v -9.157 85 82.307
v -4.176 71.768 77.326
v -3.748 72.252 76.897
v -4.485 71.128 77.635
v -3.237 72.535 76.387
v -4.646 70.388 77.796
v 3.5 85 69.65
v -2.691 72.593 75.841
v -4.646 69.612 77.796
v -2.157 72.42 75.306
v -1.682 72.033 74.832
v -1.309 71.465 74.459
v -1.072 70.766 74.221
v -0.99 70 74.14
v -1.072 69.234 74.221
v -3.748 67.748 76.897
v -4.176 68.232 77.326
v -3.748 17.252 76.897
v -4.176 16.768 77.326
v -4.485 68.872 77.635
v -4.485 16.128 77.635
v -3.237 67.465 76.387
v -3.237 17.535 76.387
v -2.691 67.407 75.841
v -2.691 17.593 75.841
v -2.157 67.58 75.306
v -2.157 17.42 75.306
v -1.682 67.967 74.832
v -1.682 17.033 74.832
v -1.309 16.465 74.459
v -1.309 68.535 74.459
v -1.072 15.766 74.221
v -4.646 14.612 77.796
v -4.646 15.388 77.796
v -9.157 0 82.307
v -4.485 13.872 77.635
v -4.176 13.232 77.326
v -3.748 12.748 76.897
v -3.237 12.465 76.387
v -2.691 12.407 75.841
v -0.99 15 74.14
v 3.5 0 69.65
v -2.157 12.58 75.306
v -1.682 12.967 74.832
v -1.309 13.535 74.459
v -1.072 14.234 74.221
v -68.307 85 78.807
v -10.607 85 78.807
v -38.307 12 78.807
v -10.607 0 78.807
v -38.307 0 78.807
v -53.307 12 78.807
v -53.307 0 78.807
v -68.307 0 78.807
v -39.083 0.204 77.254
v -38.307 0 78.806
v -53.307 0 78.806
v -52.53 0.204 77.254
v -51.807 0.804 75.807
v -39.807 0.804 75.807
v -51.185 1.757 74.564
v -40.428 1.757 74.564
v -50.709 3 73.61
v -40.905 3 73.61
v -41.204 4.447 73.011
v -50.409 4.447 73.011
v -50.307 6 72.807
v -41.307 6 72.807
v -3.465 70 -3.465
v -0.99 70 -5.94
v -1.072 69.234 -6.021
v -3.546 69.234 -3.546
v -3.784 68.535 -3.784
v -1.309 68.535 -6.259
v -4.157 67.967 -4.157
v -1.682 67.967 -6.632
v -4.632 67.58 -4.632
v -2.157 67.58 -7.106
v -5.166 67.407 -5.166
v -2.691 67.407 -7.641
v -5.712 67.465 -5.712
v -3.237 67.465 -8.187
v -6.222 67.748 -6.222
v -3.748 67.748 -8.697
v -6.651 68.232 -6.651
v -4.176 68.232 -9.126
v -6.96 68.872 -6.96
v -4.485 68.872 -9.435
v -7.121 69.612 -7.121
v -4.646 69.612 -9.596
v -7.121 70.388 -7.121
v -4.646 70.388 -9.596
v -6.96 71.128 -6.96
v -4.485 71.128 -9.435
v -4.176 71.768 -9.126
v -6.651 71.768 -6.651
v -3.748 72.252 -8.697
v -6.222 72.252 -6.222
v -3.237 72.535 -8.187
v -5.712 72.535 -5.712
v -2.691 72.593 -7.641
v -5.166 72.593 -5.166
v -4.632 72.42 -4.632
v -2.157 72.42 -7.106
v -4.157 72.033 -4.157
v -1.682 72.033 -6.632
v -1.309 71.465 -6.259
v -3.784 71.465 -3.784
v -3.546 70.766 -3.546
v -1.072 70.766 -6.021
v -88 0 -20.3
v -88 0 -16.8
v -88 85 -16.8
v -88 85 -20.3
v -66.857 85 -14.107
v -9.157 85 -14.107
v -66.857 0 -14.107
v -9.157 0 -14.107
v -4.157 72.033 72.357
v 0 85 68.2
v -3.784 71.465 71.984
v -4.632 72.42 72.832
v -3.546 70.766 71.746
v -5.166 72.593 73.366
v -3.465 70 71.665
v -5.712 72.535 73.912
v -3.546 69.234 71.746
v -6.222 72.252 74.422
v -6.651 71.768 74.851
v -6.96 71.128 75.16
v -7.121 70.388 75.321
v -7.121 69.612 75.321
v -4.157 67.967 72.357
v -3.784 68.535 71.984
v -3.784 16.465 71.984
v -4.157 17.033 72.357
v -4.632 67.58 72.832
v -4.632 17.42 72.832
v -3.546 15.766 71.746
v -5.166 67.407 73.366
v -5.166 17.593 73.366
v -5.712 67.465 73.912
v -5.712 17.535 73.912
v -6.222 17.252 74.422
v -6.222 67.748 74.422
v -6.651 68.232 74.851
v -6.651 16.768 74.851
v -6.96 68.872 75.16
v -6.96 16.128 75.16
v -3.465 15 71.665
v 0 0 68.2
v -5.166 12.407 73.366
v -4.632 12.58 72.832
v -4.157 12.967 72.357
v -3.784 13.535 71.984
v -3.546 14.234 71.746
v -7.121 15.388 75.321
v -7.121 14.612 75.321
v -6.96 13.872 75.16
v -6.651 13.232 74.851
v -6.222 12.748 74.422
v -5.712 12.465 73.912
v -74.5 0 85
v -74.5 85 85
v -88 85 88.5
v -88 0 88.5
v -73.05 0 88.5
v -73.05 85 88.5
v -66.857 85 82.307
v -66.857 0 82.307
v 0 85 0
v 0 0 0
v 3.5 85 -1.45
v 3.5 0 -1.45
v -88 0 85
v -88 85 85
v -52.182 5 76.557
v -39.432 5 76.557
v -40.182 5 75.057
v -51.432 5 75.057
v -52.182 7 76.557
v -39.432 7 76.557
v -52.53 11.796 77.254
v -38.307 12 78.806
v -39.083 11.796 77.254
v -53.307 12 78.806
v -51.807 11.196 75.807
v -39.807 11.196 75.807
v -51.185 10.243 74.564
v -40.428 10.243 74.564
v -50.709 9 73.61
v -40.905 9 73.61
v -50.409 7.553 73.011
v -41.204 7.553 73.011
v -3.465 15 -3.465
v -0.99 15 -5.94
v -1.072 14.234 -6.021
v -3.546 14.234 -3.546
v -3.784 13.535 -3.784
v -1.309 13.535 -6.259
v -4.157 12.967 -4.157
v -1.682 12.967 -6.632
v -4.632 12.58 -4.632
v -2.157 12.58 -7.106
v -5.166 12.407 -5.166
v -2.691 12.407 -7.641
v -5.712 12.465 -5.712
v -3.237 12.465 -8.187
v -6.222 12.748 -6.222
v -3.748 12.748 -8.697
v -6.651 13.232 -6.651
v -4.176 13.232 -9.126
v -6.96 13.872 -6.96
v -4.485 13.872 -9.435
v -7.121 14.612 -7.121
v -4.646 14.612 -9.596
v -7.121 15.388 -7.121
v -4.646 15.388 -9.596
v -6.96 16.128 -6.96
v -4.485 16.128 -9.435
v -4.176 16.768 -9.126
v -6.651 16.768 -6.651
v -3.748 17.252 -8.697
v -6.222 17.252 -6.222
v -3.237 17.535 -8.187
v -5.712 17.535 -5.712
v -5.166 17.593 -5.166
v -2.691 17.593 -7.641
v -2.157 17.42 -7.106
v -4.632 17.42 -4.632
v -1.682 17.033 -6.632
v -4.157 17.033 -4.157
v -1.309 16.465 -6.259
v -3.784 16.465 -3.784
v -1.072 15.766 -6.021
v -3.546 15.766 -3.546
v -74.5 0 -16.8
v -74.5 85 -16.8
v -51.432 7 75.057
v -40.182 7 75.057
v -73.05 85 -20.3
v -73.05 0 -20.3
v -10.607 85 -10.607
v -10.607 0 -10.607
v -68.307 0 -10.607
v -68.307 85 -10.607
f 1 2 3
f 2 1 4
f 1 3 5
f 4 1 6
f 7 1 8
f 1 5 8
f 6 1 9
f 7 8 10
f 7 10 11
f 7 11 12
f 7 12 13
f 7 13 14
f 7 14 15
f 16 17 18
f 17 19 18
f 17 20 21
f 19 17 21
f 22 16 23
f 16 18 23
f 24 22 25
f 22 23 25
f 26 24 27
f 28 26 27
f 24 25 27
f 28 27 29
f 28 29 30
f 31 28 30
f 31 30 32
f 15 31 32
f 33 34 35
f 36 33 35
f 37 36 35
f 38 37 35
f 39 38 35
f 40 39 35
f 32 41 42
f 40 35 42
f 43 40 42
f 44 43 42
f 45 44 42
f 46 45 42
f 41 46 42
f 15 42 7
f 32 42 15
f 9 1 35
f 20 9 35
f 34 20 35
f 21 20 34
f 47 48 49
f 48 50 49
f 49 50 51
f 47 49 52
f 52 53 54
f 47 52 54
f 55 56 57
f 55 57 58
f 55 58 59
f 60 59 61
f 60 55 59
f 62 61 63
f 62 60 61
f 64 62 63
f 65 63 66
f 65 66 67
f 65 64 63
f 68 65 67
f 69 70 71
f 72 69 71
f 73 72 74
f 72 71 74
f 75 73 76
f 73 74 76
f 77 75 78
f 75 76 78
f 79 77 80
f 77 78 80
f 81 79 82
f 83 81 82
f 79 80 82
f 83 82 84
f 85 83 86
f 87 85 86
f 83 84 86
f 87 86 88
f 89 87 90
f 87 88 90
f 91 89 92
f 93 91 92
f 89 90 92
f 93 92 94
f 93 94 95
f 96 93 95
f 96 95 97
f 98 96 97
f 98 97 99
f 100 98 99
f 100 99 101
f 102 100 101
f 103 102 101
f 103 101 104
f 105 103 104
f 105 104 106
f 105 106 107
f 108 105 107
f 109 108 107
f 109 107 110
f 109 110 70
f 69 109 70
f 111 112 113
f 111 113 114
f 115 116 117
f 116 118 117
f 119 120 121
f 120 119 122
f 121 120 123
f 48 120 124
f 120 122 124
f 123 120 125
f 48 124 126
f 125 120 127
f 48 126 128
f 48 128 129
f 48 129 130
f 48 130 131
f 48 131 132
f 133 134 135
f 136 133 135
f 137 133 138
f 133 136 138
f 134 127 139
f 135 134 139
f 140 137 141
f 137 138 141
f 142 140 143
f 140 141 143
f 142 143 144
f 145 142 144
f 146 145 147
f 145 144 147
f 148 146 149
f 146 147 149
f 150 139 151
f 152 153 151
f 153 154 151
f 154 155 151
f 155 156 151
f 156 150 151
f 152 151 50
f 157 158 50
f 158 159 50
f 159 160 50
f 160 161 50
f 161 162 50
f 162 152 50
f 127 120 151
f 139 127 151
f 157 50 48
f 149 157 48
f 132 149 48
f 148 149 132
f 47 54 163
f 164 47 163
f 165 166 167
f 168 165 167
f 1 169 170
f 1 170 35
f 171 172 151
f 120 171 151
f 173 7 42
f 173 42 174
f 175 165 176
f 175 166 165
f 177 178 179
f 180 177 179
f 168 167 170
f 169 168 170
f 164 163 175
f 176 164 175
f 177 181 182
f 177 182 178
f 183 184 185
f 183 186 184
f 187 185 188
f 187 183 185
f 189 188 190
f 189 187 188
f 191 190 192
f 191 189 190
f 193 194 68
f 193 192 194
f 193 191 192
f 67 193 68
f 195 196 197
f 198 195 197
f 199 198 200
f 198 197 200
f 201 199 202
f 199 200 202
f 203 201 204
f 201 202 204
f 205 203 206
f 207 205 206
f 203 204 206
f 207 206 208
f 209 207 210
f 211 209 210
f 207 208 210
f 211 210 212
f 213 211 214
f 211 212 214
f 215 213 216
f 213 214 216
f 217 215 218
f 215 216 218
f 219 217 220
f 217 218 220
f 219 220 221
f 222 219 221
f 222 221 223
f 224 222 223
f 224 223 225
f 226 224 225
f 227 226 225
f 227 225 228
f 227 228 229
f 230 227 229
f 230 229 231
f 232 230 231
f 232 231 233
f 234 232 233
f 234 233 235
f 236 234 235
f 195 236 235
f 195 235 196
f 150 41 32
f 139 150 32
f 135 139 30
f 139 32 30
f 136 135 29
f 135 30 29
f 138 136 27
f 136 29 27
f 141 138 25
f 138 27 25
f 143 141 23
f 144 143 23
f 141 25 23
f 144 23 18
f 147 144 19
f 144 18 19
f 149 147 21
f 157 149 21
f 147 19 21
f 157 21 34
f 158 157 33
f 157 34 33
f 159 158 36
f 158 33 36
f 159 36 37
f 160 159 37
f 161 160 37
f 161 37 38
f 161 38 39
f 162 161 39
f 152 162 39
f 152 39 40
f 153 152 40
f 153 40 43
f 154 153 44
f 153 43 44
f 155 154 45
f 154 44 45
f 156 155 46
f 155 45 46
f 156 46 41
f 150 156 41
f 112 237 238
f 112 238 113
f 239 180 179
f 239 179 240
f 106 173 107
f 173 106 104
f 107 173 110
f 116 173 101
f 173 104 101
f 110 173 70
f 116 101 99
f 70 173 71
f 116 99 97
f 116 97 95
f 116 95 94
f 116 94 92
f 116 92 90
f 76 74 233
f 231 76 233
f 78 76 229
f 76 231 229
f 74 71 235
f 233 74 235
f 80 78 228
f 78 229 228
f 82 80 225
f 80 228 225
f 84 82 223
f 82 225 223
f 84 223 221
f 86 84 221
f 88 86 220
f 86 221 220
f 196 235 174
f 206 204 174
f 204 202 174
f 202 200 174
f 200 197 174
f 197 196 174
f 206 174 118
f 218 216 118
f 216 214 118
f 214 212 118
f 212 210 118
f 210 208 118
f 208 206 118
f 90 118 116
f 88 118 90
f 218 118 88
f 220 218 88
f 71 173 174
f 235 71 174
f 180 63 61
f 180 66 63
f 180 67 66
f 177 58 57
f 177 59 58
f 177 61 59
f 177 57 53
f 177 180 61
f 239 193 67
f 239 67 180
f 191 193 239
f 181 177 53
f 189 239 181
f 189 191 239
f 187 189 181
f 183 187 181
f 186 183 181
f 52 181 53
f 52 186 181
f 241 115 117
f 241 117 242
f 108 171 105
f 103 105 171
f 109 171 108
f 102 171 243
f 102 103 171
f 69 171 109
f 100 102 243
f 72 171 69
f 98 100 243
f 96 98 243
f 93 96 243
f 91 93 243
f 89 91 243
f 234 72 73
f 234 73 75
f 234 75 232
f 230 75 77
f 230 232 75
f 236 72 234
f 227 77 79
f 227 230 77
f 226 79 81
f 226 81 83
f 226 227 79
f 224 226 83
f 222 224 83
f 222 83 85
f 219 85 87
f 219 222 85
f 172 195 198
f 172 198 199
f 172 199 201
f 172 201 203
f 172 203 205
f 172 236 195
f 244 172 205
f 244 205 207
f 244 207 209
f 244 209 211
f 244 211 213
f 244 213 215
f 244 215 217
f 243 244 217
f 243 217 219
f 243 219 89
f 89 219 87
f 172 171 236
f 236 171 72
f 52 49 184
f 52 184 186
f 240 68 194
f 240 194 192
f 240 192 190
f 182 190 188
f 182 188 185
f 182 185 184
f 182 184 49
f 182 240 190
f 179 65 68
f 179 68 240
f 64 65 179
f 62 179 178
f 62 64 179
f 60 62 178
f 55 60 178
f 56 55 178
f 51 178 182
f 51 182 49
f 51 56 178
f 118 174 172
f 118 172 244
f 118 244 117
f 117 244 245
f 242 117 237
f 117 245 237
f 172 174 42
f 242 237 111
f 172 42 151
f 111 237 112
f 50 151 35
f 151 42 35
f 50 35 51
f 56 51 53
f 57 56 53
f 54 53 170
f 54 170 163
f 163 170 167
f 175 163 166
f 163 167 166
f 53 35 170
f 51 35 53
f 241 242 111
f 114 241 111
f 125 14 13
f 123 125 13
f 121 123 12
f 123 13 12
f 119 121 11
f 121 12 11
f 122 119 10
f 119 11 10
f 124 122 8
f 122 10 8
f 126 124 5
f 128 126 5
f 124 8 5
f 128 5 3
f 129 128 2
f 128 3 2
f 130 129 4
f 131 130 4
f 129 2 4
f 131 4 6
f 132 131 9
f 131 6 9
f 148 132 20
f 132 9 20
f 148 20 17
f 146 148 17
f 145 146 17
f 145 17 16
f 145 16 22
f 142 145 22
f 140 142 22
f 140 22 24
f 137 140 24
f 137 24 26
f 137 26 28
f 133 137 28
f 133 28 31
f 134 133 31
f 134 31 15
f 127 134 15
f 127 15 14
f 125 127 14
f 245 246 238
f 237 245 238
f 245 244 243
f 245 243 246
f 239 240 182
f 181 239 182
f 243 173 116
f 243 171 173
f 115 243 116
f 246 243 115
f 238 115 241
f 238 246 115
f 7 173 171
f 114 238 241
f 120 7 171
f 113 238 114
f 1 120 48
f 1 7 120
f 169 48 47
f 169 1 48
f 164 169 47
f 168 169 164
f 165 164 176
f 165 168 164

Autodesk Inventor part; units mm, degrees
ref_plane "YZ Plane" through (0, 0, 0) normal (1, 0, 0) x (0, 1, 0)
ref_plane "XZ Plane" through (0, 0, 0) normal (0, 1, 0) x (-1, 0, 0)
sketch "Sketch1" plane through (0, 0, 0) normal (0, 1, 0) x (-1, 0, 0)
  line L0 (0, 0) -> (0, 68.2)
  line L1 (0, 68.2) -> (10.6066, 78.8066)
  line L2 (10.6066, 78.8066) -> (68.3066, 78.8066)
  line L3 (68.3066, 78.8066) -> (74.5, 85)
  line L4 (74.5, 85) -> (88, 85)
  line L5 (0, 34.1) -> (80, 34.1) construction
  line L6 (0, 0) -> (10.6066, -10.6066)
  line L7 (10.6066, -10.6066) -> (68.3066, -10.6066)
  line L8 (68.3066, -10.6066) -> (74.5, -16.8)
  line L9 (74.5, -16.8) -> (88, -16.8)
  line L10 (88, 88.5) -> (73.0503, 88.5)
  line L11 (73.0503, 88.5) -> (66.8569, 82.3066)
  line L12 (66.8569, 82.3066) -> (9.1569, 82.3066)
  line L13 (9.1569, 82.3066) -> (-3.5, 69.6497)
  line L14 (-3.5, 69.6497) -> (-3.5, -1.4497)
  line L15 (-3.5, -1.4497) -> (9.1569, -14.1066)
  line L16 (9.1569, -14.1066) -> (66.8569, -14.1066)
  line L17 (66.8569, -14.1066) -> (73.0503, -20.3)
  line L18 (73.0503, -20.3) -> (88, -20.3)
  line L19 (88, 88.5) -> (88, 85)
  line L20 (88, -16.8) -> (88, -20.3)
  dimension "d0" = 68.2
  dimension "d1" = 15
  dimension "d2" = 135
  dimension "d5" = 135
  dimension "d6" = 88
  dimension "d7" = 3.5
  dimension "d18" = 13.5
  dimension "d19" = 50.9
extrude "Extrusion1" add sketch "Sketch1" along normal blind 85
sketch "Sketch2" plane through (3.5, 0, 69.6497) normal (0.7071068, 0, 0.7071068) x (0.7071068, 0, -0.7071068)
  line L0 (-17.8995, 0) -> (0, 0) projected
  line L1 (0, 0) -> (0, 85) projected
  line L2 (-17.8995, 85) -> (0, 85) projected
  line L3 (-17.8995, 0) -> (-17.8995, 85) projected
  line L4 (-1.4497, 85) -> (-16.4497, 85) construction
  line L5 (-8.9497, 85) -> (-8.9497, 0) construction
  line L6 (-17.8995, 0) -> (0, 0) construction
  circle A0 centre (-8.9497, 70) radius 2.6
  circle A1 centre (-8.9497, 15) radius 2.6
  point P0 (46.7749, 0)
  dimension "d10" = 5.2
  dimension "d11" = 5.2
  dimension "d12" = 15
  dimension "d13" = 15
extrude "Extrusion2" cut sketch "Sketch2" against normal up to next contours A0 | A1
ref_plane "Work Plane1" through (-88, 0, 34.1) normal (0, 0, 1) x (1, 0, 0)
mirror "Mirror1" about plane through (-88, 0, 34.1) normal (0, 0, 1) of "Extrusion2"
sketch "Sketch4" plane through (-10.6066, 0, 78.8066) normal (0, 0, -1) x (-1, 0, 0)
  line L0 (27.7, 12) -> (42.7, 12)
  line L1 (42.7, 12) -> (42.7, 0)
  line L2 (42.7, 0) -> (27.7, 0)
  line L3 (27.7, 0) -> (27.7, 12)
  line L4 (0, 85) -> (57.7, 85) projected
  line L5 (57.7, 0) -> (57.7, 85) projected
  line L6 (0, 0) -> (57.7, 0) projected
  point P0 (-10.6066, 0)
  dimension "d20" = 15
  dimension "d21" = 12
  dimension "d22" = 15
extrude "Extrusion4" add sketch "Sketch4" along normal blind 6
sketch "Sketch5" plane through (-53.3066, 0, 78.8066) normal (-1, 0, 0) x (0, 0, 1)
  line L0 (0, 12) -> (0, 0) projected
  line L1 (0, 12) -> (-6, 12) projected
  line L2 (-6, 0) -> (-6, 12) projected
  line L3 (0, 0) -> (-6, 0) projected
  line L4 (-3.75, 7) -> (-2.25, 7)
  line L5 (-2.25, 7) -> (-2.25, 5)
  line L6 (-2.25, 5) -> (-3.75, 5)
  line L7 (-3.75, 5) -> (-3.75, 7)
  line L8 (-6, 0) -> (-6, 12) construction
  line L9 (-6, 6) -> (-3.75, 6) construction
  line L10 (0, 12) -> (-6, 12) construction
  line L11 (-3, 12) -> (-3, 7) construction
  point P0 (-78.8066, 0)
  dimension "d25" = 1.5
  dimension "d26" = 2
extrude "Extrusion5" cut sketch "Sketch5" against normal up to next contours L4 L5 L6 L7
chamfer "Chamfer1" distance 3 distance2 6 1 edges at (-53.3066, 6, 72.8066) measured on face at (-43.3066, 8, 72.8066)
chamfer "Chamfer2" distance 3 distance2 6 1 edges at (-38.3066, 6, 72.8066) measured on face at (-42.3066, 8, 72.8066)
fillet "Fillet1" radius 6 2 edges at (-45.8066, 12, 72.8066) (-45.8066, 0, 72.8066)
equation "\"d11\" = d10"
equation "\"d13\" = d12"
properties part number "Z Axis Cover Bottom"
